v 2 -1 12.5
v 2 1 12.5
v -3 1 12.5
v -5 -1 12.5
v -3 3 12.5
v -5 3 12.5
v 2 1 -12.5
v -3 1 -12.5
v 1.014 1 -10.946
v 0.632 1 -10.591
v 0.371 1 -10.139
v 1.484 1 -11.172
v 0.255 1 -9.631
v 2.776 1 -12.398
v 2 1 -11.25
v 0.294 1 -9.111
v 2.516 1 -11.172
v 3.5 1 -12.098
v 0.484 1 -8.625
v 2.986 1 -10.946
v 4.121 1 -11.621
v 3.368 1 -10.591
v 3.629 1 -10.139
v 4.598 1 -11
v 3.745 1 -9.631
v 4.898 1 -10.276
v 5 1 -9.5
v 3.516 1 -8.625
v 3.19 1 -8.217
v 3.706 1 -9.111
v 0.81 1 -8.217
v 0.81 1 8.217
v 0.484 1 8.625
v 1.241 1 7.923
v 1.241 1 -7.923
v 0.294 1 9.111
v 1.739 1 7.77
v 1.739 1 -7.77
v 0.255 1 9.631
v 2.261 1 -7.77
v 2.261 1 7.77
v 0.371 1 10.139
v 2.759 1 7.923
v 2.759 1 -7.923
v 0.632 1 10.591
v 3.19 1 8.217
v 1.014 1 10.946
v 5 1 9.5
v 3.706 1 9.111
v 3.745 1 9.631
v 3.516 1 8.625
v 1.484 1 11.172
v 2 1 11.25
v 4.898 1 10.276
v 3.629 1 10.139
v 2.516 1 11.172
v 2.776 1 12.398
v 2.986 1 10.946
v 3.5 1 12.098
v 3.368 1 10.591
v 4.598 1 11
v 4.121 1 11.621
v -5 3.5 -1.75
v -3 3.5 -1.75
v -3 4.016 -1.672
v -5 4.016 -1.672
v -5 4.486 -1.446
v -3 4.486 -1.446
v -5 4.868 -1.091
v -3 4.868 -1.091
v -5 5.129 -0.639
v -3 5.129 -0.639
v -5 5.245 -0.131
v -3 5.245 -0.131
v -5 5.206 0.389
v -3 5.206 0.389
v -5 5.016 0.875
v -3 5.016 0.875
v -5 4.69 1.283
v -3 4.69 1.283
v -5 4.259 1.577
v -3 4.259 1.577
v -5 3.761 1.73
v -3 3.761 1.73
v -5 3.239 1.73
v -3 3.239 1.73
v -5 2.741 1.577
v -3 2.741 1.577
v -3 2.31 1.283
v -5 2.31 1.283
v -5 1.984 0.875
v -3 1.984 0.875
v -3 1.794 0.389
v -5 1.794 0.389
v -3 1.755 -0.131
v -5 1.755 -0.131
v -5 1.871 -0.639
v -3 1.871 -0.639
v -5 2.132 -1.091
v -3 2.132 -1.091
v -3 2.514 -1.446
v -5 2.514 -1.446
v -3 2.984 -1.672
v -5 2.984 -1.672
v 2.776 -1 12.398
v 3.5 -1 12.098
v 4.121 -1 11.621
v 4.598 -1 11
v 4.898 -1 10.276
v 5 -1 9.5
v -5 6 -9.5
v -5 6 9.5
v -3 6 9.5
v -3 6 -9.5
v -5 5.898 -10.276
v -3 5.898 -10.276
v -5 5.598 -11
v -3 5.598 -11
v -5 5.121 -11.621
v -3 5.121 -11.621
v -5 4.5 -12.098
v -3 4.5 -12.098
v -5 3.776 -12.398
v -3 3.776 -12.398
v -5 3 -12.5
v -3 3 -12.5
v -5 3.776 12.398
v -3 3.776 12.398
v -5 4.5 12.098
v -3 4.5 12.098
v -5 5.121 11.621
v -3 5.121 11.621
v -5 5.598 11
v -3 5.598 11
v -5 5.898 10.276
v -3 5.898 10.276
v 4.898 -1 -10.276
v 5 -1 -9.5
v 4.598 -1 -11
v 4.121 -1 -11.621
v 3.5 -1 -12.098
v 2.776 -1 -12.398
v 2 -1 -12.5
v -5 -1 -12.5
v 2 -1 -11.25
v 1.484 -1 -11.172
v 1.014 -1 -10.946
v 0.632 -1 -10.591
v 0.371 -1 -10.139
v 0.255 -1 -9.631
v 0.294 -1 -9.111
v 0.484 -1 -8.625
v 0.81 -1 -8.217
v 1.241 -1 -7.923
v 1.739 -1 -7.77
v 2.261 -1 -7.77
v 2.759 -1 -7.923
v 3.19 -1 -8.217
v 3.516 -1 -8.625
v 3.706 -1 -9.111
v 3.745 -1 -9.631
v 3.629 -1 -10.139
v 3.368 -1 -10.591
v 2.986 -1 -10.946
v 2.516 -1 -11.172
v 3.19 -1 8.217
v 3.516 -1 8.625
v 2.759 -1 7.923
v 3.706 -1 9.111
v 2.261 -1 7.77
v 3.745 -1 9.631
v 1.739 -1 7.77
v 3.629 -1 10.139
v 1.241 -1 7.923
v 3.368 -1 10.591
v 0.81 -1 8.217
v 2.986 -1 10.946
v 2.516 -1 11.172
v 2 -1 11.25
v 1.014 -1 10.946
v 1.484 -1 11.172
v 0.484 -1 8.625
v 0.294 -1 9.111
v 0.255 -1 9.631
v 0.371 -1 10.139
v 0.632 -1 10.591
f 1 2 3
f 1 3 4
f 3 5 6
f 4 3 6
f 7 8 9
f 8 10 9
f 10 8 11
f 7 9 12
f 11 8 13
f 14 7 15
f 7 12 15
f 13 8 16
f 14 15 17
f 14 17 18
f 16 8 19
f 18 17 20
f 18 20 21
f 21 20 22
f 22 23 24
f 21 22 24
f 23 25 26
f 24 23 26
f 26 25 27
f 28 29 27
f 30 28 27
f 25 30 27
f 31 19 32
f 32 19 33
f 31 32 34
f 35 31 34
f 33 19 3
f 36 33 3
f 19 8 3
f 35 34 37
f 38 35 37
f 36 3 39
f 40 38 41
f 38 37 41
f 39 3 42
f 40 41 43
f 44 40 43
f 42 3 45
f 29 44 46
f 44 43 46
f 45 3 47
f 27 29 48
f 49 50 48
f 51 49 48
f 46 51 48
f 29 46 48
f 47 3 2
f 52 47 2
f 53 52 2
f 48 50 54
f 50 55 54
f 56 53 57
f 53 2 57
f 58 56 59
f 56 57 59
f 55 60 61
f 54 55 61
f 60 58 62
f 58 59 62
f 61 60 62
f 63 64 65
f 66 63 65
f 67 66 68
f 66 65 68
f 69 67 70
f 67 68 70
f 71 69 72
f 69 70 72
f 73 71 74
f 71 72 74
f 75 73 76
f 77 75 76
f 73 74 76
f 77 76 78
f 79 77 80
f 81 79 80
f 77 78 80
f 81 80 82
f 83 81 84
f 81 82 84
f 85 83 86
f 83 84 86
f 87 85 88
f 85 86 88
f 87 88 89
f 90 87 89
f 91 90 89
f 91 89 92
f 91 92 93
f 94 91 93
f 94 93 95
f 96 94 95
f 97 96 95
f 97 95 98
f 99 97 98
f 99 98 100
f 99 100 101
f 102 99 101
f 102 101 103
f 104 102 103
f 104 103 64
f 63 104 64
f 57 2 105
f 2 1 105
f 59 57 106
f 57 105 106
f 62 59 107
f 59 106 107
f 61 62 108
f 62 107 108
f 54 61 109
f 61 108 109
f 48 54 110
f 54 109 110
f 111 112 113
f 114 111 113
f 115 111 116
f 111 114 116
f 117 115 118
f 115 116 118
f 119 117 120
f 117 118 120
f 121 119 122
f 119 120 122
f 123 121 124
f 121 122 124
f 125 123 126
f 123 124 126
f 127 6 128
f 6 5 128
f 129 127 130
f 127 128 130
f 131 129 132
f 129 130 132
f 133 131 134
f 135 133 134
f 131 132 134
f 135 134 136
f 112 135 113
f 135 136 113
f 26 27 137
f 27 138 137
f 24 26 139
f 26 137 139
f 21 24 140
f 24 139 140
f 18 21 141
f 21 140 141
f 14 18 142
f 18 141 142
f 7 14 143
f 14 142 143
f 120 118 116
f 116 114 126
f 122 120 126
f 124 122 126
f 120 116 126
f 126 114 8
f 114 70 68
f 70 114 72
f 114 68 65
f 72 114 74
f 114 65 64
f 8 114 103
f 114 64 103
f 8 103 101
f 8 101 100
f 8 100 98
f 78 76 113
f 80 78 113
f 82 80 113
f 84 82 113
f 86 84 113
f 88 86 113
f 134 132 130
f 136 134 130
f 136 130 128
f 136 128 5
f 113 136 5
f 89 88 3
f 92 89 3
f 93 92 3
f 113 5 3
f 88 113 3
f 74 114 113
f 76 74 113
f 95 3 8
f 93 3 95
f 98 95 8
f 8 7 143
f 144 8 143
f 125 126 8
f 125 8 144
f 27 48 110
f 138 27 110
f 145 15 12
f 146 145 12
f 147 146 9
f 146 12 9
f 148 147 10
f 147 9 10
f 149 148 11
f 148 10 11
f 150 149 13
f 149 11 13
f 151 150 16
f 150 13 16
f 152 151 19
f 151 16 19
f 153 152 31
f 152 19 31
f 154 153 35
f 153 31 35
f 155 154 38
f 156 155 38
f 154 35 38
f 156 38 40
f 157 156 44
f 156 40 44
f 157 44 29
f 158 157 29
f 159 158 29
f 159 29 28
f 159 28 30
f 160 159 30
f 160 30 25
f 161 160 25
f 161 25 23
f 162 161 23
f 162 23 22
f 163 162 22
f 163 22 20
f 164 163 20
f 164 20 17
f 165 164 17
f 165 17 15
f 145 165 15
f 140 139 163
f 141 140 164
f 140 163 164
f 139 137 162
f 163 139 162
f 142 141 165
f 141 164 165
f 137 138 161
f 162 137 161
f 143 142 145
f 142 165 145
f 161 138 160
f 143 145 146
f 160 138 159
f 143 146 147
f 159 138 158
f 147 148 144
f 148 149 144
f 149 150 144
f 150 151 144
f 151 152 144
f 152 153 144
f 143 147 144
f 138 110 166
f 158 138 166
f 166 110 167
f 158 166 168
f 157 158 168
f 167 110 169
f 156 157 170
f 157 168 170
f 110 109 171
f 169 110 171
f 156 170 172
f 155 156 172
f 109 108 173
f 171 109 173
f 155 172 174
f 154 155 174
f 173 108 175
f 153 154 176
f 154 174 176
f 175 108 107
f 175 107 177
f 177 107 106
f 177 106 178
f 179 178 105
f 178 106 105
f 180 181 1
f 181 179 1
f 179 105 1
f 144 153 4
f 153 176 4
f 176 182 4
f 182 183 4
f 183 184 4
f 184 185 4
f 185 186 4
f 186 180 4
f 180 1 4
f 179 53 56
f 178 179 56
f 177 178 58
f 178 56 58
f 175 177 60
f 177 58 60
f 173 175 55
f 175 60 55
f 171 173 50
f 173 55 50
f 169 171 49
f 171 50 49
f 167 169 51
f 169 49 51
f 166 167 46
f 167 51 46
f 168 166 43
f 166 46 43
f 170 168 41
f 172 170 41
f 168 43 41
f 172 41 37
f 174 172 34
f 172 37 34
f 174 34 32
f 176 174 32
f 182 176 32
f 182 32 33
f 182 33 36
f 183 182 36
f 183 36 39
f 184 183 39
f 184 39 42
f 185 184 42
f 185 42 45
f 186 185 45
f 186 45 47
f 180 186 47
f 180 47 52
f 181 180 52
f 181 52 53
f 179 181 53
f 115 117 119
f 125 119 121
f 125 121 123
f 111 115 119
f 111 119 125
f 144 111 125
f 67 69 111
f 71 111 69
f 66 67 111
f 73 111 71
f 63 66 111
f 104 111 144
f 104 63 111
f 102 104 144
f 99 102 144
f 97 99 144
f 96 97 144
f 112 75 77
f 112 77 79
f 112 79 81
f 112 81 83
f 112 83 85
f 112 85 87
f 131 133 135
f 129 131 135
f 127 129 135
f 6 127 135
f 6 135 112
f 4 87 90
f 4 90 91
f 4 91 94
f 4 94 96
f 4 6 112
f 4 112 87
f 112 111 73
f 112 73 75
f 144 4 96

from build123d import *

# Parameters (mm, degrees)
BOSS_EXTRUDE1_DEPTH = 12.5
FILLET1_R           = 3
SKETCH2_R           = 1.75
CUT_EXTRUDE1_DEPTH  = 15.361406616
SKETCH3_R           = 1.75
CUT_EXTRUDE2_DEPTH  = 17.007810594


with BuildPart() as part:
    # Sketch1 → Boss-Extrude1 (new, symmetric)
    with BuildSketch(Plane.XY):
        Polygon((-3, 1), (5, 1), (5, -1), (-5, -1), (-5, 1), (-5, 6), (-3, 6), align=None)
    extrude(amount=BOSS_EXTRUDE1_DEPTH, both=True)

    # Fillet1
    fillet1_edges = [part.edges().sort_by_distance(p)[0] for p in [
        (5, 0, -12.5),
        (-4, 6, 12.5),
        (5, 0, 12.5),
        (-4, 6, -12.5),
    ]]
    fillet(fillet1_edges, radius=FILLET1_R)

    # Sketch2 → Cut-Extrude1 (cut, through all)
    with BuildSketch(Plane(origin=(0, 1, 0), x_dir=(1, 0, 0), z_dir=(0, 1, 0))):
        with Locations(Location((2, -9.5, 0), (0, 0, 270))):
            Circle(SKETCH2_R)
        with Locations(Location((2, 9.5, 0), (0, 0, 90))):
            Circle(SKETCH2_R)
    extrude(amount=-CUT_EXTRUDE1_DEPTH, mode=Mode.SUBTRACT)

    # Sketch3 → Cut-Extrude2 (cut, through all)
    with BuildSketch(Plane(origin=(-3, 0, 0), x_dir=(0, 0, -1), z_dir=(1, 0, 0))):
        with Locations((0, 3.5)):
            Circle(SKETCH3_R)
    extrude(amount=-CUT_EXTRUDE2_DEPTH, mode=Mode.SUBTRACT)


solid = part.part
